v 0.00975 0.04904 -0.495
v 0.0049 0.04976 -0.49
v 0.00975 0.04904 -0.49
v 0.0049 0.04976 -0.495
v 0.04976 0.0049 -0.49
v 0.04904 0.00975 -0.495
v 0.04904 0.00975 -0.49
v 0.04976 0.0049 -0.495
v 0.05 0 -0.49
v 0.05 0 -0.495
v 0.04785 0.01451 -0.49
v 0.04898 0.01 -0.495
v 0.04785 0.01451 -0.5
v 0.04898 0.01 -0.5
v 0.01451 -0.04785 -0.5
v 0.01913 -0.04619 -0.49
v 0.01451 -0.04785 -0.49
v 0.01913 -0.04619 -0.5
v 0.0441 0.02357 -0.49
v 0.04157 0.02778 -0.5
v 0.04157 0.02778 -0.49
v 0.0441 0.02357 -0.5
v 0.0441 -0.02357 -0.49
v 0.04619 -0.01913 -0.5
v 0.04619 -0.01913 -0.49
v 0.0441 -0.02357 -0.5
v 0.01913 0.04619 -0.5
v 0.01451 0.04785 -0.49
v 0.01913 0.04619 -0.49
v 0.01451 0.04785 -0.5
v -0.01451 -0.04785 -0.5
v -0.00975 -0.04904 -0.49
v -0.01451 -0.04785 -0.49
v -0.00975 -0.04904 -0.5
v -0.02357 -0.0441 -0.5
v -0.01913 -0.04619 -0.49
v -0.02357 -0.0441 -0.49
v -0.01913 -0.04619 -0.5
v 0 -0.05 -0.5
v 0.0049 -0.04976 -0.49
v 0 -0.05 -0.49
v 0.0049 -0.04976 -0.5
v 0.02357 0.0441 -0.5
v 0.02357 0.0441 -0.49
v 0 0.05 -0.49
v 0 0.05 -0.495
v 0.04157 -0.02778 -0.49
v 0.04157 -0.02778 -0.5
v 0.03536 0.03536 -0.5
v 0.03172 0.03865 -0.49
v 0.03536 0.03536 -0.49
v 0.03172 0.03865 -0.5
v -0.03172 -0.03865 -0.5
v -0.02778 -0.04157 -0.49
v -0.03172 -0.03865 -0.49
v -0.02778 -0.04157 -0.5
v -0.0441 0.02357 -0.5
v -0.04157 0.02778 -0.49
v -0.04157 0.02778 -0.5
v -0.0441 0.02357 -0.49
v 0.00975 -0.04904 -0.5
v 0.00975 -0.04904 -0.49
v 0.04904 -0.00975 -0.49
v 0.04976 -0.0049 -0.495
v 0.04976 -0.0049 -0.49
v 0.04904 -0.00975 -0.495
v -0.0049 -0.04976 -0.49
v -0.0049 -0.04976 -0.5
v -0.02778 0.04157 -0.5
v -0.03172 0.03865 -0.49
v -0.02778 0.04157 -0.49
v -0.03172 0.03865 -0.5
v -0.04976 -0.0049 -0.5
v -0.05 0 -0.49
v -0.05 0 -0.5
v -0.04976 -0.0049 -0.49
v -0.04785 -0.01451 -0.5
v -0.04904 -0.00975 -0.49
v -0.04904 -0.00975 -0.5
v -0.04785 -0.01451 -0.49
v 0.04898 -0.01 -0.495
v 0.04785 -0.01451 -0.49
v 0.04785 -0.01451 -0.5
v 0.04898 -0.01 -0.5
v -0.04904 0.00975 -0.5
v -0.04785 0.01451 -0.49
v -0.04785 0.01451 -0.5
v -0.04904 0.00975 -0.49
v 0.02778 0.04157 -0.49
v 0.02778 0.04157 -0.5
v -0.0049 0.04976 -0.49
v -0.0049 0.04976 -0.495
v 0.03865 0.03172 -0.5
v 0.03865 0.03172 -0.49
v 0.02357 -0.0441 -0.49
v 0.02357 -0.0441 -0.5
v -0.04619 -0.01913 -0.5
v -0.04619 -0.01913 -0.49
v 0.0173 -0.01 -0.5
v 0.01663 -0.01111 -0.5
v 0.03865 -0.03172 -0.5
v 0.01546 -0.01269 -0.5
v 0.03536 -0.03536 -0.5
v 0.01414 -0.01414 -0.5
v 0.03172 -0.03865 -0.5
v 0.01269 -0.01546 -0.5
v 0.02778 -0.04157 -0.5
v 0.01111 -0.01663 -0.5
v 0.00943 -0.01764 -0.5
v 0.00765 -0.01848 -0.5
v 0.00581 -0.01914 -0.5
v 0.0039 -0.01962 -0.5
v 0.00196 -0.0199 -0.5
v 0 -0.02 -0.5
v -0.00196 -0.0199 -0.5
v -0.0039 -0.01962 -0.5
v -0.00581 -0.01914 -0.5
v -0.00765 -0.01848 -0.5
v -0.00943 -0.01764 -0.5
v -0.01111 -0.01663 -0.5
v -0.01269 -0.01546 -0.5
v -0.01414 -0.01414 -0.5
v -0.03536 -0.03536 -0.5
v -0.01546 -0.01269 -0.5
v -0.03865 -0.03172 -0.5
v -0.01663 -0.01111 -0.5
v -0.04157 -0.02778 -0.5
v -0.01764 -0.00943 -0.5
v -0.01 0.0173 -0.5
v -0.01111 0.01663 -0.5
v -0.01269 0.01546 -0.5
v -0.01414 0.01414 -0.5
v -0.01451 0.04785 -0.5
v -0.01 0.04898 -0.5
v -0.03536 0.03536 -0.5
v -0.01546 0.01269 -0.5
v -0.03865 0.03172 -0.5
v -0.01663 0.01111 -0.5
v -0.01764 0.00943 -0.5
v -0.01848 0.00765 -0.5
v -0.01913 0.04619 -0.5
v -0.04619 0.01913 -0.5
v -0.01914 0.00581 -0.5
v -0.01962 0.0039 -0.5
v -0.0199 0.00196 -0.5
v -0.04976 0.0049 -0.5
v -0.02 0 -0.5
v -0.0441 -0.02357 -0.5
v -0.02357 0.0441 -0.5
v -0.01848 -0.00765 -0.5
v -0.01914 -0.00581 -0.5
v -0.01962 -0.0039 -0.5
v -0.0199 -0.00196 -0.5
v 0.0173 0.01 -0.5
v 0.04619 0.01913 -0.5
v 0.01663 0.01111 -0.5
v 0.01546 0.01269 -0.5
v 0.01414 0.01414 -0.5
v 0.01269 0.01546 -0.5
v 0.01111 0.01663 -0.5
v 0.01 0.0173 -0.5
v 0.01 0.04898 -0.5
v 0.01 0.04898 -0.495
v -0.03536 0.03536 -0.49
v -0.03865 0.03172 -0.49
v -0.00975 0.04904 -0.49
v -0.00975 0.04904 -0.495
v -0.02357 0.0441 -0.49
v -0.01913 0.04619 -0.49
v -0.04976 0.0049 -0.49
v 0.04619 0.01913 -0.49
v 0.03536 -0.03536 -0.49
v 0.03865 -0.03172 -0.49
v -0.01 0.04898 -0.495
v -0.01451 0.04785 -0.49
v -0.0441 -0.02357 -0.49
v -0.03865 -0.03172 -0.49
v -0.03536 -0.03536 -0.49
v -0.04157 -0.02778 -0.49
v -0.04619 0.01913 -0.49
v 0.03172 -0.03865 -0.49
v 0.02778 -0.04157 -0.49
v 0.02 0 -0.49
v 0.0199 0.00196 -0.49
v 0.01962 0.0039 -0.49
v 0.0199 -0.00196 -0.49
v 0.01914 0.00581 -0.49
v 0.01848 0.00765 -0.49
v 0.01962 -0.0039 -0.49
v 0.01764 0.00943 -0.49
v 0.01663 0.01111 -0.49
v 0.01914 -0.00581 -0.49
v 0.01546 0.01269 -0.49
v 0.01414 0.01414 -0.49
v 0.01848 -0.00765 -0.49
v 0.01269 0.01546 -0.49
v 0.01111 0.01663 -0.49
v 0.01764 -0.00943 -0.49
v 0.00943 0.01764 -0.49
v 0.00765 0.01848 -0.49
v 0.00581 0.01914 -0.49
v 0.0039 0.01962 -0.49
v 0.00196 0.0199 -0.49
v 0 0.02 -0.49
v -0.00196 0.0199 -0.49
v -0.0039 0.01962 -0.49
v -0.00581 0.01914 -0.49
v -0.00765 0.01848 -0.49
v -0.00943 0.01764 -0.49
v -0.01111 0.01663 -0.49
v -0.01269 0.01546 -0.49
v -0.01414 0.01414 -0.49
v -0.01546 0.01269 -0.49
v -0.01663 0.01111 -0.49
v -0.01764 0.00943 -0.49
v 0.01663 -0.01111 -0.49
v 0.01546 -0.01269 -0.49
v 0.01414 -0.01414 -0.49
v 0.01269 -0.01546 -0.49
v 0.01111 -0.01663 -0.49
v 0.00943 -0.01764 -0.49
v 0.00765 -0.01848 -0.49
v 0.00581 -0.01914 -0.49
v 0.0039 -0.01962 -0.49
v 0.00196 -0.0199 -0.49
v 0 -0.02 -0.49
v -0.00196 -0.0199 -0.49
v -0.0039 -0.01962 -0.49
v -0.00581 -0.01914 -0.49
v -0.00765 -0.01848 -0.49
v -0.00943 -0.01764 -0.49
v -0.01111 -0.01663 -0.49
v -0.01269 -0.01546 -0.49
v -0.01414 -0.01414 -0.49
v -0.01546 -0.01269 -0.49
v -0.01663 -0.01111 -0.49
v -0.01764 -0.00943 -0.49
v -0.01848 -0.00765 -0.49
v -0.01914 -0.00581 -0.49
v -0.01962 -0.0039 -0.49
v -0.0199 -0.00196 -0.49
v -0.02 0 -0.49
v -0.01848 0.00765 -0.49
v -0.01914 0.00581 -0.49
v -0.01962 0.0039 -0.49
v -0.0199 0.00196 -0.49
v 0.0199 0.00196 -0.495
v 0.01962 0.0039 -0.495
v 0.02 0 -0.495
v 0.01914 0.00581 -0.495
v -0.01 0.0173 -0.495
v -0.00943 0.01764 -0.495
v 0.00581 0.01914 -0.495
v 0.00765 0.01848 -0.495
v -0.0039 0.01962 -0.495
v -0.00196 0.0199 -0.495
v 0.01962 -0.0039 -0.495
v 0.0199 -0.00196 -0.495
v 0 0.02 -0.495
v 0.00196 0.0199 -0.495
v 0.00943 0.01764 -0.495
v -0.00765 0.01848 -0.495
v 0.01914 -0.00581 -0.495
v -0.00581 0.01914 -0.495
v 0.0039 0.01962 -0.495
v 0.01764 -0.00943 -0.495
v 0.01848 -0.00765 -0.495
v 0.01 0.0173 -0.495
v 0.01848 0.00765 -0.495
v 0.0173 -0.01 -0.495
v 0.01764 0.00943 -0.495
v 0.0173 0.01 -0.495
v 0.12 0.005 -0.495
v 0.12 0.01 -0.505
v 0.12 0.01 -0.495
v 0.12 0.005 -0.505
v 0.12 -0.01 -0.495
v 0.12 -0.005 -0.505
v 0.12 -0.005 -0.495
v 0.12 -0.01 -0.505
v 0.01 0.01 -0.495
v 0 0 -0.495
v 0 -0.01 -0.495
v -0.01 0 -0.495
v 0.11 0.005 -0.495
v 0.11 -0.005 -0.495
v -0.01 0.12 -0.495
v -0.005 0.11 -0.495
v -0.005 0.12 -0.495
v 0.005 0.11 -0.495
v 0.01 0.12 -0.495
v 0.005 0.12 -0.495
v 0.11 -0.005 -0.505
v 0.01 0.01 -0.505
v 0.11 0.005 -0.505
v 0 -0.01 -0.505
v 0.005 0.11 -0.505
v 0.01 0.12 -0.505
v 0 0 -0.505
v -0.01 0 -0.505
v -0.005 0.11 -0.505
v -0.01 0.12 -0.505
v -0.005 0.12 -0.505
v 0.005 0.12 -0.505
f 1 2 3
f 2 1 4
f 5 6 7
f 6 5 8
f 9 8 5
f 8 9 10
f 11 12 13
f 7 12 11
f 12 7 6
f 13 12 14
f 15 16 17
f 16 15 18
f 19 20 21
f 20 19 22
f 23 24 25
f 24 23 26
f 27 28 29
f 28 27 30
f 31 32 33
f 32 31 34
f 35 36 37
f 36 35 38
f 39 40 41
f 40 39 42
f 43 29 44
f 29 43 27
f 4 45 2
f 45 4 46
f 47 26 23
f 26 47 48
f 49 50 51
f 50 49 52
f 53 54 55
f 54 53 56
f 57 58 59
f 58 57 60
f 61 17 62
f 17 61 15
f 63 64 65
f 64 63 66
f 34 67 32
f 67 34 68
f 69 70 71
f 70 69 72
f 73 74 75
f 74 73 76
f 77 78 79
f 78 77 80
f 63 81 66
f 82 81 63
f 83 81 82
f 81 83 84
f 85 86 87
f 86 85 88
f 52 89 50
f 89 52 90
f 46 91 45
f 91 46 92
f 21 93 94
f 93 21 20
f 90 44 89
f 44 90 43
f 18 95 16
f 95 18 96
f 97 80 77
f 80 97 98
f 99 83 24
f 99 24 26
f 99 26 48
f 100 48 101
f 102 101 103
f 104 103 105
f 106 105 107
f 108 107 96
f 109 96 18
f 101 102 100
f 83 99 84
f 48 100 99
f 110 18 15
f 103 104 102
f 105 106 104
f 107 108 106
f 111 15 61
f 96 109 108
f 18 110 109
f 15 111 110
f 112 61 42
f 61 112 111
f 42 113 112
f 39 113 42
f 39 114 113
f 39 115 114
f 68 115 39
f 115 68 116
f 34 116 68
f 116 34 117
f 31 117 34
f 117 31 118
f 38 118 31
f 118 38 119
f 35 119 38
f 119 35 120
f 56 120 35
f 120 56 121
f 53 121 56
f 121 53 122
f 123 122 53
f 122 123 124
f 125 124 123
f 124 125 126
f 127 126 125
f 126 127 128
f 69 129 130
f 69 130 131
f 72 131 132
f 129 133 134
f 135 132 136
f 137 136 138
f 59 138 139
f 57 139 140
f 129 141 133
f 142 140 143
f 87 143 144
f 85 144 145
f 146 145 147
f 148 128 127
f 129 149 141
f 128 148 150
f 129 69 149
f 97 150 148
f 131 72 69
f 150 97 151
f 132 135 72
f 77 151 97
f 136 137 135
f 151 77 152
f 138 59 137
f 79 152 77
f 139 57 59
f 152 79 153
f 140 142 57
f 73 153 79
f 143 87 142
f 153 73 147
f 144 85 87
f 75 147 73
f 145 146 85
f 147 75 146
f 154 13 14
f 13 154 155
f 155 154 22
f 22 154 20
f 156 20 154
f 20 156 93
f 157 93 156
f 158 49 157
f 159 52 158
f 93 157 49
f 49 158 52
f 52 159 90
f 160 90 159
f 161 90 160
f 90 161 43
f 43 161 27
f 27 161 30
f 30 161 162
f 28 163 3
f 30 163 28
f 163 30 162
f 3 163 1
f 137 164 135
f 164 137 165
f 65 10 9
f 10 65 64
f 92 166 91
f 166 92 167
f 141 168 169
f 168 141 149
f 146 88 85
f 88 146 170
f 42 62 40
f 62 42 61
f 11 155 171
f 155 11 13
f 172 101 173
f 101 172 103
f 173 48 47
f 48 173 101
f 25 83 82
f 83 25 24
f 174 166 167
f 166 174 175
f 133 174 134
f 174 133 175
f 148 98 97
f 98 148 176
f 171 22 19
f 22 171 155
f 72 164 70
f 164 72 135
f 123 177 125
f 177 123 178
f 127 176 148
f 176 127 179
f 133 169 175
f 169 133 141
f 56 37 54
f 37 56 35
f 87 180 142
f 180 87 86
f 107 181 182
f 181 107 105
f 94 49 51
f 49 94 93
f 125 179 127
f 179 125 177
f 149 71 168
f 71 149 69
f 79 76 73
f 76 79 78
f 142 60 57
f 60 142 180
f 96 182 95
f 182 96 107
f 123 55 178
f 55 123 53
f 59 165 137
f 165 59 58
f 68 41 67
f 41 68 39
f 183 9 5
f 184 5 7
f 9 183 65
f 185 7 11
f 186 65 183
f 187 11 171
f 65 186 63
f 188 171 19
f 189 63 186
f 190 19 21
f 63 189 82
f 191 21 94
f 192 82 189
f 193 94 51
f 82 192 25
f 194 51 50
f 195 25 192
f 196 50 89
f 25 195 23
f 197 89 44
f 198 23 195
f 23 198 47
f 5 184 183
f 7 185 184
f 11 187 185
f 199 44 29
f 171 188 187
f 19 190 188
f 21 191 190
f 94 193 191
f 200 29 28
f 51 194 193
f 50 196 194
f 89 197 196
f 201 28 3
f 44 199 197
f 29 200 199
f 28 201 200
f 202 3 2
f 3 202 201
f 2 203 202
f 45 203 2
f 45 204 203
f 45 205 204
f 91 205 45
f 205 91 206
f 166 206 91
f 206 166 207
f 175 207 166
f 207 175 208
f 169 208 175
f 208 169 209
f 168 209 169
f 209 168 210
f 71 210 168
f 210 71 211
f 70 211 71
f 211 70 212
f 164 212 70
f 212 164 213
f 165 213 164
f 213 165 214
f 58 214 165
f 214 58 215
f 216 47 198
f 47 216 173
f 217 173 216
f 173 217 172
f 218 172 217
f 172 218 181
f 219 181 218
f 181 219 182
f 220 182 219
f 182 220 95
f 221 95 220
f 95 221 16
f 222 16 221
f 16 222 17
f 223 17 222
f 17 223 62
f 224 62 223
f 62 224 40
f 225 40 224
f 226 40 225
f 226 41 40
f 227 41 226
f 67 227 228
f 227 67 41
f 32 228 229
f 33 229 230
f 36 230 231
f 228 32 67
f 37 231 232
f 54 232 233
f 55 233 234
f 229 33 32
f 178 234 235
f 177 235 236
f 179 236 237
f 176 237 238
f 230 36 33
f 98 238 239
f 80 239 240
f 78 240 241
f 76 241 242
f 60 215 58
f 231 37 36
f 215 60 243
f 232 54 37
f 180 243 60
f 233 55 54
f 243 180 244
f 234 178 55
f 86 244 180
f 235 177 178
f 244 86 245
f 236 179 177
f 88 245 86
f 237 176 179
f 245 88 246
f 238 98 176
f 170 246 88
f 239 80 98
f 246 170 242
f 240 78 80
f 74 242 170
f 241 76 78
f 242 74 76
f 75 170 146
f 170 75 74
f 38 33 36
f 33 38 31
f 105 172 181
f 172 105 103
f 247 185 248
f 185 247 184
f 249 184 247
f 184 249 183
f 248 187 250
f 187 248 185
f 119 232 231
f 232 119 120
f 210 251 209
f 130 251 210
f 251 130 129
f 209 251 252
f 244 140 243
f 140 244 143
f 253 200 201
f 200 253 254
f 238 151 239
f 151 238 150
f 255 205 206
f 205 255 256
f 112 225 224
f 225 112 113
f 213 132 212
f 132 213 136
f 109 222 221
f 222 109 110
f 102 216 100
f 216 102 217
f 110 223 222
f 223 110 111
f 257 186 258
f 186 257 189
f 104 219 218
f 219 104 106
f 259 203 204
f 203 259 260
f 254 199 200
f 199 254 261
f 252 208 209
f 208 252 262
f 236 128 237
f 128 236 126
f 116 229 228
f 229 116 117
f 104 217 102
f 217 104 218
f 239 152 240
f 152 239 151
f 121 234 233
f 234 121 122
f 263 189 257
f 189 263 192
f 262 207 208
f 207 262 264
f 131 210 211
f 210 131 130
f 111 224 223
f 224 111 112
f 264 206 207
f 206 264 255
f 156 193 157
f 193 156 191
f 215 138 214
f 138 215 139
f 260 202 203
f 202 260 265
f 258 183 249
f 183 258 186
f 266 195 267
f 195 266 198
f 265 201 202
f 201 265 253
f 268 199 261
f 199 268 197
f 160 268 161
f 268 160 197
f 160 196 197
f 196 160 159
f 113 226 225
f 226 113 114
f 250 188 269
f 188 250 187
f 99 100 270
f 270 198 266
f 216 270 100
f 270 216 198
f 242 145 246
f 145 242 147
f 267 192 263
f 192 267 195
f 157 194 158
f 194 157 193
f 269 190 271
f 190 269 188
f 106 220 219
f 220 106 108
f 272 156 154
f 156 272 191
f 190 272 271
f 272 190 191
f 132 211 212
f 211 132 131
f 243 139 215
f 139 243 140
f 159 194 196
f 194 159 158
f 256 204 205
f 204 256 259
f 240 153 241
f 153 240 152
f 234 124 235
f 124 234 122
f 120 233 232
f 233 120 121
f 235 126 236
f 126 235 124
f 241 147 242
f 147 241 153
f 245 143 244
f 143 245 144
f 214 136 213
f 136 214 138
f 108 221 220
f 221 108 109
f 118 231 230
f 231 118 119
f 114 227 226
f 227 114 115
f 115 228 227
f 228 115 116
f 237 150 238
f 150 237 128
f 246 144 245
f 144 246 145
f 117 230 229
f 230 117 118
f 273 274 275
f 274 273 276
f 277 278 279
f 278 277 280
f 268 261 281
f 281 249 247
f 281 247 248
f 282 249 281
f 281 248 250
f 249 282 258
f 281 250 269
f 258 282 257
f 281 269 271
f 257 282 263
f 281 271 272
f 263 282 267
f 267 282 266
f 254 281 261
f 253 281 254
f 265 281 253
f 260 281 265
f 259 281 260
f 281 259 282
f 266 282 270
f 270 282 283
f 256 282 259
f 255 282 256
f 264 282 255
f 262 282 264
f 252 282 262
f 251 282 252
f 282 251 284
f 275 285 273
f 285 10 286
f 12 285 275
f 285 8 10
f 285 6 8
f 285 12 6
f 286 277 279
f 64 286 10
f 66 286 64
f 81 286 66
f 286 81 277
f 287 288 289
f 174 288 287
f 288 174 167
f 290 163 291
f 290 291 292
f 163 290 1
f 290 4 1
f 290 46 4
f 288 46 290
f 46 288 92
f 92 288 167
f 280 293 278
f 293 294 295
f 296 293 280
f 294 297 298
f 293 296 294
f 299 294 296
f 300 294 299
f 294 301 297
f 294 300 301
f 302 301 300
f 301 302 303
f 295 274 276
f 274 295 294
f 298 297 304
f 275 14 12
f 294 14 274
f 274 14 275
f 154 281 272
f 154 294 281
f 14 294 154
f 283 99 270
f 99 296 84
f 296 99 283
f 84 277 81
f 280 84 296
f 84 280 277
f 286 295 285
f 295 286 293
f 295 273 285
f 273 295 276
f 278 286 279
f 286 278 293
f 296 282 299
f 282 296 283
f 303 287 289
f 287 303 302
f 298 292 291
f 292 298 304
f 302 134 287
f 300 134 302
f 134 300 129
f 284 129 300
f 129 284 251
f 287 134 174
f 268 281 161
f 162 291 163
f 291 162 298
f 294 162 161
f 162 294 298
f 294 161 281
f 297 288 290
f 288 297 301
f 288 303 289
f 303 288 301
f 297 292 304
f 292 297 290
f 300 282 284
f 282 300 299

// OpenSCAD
module bracket() {
    difference() {
        union() {
            // Central ring
            difference() {
                cylinder(h=1, r=5, $fn=64);
                cylinder(h=2, r=2, $fn=64);
            }
            
            // Horizontal clevis arm
            translate([5, 0, 0])
            union() {
                cube([10, 2, 1], center=true);
                translate([5, 0, 0])
                difference() {
                    cube([4, 2, 1], center=true);
                    translate([2, 0, 0])
                    cube([2, 1, 1.1], center=true);
                }
            }
            
            // Vertical clevis arm
            translate([0, 5, 0])
            rotate([0, 0, 90])
            union() {
                cube([10, 2, 1], center=true);
                translate([5, 0, 0])
                difference() {
                    cube([4, 2, 1], center=true);
                    translate([2, 0, 0])
                    cube([2, 1, 1.1], center=true);
                }
            }
        }
    }
}

translate([0, 0, -0.5])
scale([0.01, 0.01, 0.01])
bracket();
